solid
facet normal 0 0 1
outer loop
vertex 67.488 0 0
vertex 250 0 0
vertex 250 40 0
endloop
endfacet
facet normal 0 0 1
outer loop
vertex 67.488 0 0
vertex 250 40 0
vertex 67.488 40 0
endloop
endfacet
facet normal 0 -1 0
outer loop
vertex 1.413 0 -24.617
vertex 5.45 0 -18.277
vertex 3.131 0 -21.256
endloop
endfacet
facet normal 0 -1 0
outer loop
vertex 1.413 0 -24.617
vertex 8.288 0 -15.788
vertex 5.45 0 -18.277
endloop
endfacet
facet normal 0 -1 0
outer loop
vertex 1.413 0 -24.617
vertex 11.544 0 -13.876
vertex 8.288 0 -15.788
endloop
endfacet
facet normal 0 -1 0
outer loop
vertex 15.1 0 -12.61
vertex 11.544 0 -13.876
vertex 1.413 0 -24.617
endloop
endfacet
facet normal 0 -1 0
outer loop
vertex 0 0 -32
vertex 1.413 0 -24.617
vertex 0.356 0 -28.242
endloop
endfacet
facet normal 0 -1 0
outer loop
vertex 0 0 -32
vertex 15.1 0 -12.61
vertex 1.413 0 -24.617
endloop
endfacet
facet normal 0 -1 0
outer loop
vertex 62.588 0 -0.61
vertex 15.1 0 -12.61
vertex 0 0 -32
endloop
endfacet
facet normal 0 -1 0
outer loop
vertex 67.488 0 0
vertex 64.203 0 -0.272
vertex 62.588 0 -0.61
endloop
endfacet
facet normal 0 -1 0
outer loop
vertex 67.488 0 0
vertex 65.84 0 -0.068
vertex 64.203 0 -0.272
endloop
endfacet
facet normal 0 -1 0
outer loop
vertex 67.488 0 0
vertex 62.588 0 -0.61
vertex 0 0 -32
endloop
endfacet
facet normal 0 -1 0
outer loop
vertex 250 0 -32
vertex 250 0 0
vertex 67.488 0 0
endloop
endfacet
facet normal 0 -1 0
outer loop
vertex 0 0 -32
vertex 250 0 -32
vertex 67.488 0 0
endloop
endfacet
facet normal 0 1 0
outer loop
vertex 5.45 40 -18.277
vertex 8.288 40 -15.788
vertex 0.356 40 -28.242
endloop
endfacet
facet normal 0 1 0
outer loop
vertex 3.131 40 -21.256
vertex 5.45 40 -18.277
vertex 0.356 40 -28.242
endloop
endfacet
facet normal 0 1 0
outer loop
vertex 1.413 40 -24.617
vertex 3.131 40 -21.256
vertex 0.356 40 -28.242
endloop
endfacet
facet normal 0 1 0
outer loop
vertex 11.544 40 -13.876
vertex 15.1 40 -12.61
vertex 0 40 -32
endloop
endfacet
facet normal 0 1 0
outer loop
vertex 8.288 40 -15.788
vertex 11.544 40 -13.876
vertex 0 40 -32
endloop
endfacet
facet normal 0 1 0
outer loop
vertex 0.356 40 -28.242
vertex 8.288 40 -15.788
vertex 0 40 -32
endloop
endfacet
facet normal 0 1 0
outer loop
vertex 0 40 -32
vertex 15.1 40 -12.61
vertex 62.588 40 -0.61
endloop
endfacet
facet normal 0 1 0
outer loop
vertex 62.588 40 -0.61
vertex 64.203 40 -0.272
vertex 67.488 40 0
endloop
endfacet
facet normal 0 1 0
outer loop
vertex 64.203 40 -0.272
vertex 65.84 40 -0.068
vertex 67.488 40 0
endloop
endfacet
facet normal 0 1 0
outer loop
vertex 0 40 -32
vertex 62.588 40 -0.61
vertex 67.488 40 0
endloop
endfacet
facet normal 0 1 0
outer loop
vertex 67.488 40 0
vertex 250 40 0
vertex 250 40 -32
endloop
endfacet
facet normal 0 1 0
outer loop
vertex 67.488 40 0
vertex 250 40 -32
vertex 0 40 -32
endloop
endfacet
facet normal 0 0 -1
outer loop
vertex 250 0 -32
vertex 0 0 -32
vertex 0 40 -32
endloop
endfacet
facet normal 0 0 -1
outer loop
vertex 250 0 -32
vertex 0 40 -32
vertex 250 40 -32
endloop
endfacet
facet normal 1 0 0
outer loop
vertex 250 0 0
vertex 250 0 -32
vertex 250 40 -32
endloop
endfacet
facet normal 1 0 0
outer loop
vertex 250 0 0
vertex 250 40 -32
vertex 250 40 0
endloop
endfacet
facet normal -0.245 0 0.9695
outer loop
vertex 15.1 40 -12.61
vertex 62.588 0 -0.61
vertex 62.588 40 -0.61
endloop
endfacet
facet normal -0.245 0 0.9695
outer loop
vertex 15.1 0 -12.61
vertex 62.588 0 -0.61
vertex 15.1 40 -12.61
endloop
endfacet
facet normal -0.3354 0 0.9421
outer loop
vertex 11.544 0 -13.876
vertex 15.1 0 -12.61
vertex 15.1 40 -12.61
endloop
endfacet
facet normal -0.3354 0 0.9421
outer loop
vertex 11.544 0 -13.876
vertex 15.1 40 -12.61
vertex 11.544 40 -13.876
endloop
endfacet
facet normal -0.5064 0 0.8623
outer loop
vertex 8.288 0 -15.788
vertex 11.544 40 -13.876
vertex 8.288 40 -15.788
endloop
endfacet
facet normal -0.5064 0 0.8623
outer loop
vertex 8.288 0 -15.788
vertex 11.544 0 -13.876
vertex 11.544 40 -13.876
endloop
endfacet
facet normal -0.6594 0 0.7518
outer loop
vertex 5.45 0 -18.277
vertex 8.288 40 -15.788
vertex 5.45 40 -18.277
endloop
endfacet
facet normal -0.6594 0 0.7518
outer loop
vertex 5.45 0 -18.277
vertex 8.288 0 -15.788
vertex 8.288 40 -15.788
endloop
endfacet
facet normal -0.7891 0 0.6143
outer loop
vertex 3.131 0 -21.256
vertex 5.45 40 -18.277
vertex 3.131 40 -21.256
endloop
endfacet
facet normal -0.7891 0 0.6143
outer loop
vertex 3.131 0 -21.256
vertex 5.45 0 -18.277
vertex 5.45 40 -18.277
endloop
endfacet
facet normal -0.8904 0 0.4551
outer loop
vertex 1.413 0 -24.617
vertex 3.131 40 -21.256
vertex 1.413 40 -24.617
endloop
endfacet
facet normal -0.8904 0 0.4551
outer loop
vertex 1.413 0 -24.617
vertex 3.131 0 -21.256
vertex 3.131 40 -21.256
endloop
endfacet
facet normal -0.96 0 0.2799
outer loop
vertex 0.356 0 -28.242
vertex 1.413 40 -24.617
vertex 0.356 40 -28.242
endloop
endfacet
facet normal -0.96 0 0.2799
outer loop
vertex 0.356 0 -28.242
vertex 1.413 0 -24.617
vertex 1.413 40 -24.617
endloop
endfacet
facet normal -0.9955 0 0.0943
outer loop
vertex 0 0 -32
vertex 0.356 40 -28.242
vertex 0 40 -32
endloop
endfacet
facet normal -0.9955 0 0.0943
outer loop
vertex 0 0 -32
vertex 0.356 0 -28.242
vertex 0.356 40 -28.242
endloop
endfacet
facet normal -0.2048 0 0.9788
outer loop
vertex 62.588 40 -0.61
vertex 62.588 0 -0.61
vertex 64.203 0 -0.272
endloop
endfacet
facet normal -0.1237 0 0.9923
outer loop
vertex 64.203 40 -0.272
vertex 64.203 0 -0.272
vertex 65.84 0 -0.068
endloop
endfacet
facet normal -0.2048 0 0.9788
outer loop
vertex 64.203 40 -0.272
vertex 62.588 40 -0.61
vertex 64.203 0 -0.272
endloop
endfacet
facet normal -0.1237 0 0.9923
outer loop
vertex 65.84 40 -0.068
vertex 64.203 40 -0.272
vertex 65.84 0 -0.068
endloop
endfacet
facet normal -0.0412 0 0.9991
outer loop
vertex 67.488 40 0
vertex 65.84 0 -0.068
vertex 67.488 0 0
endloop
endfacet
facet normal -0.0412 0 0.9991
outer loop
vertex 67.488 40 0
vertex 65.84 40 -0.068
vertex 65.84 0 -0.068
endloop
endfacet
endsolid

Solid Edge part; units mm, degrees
sketch "Sketch1" plane through (0, 0, 0) normal (0, -1, 0) x (1, 0, 0)
  line L0 (0, -32) -> (250, -32)
  line L1 (250, -32) -> (250, 0)
  line L2 (250, 0) -> (0, 0)
  line L3 (0, 0) -> (0, -32)
extrude "Protrusion1" add sketch "Sketch1" against normal blind 40
fillet "Round_1" [suppressed]
sketch "Sketch2" plane through (125, 0, -16) normal (0, -1, 0) x (1, 0, 0)
  line L0 (-60, 16) -> (-109.8999, 3.3905)
  arc A0 (-125, -16) -> (-109.8999, 3.3905) centre (-105, -16) cw
  line L1 (-125, 16) -> (-125, -16)
  line L2 (-60, 16) -> (-125, 16)
extrude "ExtrudedCutout_2" cut sketch "Sketch2" against normal blind 50
fillet "Round_2" radius 20 1 edges at (65, 20, 0)
